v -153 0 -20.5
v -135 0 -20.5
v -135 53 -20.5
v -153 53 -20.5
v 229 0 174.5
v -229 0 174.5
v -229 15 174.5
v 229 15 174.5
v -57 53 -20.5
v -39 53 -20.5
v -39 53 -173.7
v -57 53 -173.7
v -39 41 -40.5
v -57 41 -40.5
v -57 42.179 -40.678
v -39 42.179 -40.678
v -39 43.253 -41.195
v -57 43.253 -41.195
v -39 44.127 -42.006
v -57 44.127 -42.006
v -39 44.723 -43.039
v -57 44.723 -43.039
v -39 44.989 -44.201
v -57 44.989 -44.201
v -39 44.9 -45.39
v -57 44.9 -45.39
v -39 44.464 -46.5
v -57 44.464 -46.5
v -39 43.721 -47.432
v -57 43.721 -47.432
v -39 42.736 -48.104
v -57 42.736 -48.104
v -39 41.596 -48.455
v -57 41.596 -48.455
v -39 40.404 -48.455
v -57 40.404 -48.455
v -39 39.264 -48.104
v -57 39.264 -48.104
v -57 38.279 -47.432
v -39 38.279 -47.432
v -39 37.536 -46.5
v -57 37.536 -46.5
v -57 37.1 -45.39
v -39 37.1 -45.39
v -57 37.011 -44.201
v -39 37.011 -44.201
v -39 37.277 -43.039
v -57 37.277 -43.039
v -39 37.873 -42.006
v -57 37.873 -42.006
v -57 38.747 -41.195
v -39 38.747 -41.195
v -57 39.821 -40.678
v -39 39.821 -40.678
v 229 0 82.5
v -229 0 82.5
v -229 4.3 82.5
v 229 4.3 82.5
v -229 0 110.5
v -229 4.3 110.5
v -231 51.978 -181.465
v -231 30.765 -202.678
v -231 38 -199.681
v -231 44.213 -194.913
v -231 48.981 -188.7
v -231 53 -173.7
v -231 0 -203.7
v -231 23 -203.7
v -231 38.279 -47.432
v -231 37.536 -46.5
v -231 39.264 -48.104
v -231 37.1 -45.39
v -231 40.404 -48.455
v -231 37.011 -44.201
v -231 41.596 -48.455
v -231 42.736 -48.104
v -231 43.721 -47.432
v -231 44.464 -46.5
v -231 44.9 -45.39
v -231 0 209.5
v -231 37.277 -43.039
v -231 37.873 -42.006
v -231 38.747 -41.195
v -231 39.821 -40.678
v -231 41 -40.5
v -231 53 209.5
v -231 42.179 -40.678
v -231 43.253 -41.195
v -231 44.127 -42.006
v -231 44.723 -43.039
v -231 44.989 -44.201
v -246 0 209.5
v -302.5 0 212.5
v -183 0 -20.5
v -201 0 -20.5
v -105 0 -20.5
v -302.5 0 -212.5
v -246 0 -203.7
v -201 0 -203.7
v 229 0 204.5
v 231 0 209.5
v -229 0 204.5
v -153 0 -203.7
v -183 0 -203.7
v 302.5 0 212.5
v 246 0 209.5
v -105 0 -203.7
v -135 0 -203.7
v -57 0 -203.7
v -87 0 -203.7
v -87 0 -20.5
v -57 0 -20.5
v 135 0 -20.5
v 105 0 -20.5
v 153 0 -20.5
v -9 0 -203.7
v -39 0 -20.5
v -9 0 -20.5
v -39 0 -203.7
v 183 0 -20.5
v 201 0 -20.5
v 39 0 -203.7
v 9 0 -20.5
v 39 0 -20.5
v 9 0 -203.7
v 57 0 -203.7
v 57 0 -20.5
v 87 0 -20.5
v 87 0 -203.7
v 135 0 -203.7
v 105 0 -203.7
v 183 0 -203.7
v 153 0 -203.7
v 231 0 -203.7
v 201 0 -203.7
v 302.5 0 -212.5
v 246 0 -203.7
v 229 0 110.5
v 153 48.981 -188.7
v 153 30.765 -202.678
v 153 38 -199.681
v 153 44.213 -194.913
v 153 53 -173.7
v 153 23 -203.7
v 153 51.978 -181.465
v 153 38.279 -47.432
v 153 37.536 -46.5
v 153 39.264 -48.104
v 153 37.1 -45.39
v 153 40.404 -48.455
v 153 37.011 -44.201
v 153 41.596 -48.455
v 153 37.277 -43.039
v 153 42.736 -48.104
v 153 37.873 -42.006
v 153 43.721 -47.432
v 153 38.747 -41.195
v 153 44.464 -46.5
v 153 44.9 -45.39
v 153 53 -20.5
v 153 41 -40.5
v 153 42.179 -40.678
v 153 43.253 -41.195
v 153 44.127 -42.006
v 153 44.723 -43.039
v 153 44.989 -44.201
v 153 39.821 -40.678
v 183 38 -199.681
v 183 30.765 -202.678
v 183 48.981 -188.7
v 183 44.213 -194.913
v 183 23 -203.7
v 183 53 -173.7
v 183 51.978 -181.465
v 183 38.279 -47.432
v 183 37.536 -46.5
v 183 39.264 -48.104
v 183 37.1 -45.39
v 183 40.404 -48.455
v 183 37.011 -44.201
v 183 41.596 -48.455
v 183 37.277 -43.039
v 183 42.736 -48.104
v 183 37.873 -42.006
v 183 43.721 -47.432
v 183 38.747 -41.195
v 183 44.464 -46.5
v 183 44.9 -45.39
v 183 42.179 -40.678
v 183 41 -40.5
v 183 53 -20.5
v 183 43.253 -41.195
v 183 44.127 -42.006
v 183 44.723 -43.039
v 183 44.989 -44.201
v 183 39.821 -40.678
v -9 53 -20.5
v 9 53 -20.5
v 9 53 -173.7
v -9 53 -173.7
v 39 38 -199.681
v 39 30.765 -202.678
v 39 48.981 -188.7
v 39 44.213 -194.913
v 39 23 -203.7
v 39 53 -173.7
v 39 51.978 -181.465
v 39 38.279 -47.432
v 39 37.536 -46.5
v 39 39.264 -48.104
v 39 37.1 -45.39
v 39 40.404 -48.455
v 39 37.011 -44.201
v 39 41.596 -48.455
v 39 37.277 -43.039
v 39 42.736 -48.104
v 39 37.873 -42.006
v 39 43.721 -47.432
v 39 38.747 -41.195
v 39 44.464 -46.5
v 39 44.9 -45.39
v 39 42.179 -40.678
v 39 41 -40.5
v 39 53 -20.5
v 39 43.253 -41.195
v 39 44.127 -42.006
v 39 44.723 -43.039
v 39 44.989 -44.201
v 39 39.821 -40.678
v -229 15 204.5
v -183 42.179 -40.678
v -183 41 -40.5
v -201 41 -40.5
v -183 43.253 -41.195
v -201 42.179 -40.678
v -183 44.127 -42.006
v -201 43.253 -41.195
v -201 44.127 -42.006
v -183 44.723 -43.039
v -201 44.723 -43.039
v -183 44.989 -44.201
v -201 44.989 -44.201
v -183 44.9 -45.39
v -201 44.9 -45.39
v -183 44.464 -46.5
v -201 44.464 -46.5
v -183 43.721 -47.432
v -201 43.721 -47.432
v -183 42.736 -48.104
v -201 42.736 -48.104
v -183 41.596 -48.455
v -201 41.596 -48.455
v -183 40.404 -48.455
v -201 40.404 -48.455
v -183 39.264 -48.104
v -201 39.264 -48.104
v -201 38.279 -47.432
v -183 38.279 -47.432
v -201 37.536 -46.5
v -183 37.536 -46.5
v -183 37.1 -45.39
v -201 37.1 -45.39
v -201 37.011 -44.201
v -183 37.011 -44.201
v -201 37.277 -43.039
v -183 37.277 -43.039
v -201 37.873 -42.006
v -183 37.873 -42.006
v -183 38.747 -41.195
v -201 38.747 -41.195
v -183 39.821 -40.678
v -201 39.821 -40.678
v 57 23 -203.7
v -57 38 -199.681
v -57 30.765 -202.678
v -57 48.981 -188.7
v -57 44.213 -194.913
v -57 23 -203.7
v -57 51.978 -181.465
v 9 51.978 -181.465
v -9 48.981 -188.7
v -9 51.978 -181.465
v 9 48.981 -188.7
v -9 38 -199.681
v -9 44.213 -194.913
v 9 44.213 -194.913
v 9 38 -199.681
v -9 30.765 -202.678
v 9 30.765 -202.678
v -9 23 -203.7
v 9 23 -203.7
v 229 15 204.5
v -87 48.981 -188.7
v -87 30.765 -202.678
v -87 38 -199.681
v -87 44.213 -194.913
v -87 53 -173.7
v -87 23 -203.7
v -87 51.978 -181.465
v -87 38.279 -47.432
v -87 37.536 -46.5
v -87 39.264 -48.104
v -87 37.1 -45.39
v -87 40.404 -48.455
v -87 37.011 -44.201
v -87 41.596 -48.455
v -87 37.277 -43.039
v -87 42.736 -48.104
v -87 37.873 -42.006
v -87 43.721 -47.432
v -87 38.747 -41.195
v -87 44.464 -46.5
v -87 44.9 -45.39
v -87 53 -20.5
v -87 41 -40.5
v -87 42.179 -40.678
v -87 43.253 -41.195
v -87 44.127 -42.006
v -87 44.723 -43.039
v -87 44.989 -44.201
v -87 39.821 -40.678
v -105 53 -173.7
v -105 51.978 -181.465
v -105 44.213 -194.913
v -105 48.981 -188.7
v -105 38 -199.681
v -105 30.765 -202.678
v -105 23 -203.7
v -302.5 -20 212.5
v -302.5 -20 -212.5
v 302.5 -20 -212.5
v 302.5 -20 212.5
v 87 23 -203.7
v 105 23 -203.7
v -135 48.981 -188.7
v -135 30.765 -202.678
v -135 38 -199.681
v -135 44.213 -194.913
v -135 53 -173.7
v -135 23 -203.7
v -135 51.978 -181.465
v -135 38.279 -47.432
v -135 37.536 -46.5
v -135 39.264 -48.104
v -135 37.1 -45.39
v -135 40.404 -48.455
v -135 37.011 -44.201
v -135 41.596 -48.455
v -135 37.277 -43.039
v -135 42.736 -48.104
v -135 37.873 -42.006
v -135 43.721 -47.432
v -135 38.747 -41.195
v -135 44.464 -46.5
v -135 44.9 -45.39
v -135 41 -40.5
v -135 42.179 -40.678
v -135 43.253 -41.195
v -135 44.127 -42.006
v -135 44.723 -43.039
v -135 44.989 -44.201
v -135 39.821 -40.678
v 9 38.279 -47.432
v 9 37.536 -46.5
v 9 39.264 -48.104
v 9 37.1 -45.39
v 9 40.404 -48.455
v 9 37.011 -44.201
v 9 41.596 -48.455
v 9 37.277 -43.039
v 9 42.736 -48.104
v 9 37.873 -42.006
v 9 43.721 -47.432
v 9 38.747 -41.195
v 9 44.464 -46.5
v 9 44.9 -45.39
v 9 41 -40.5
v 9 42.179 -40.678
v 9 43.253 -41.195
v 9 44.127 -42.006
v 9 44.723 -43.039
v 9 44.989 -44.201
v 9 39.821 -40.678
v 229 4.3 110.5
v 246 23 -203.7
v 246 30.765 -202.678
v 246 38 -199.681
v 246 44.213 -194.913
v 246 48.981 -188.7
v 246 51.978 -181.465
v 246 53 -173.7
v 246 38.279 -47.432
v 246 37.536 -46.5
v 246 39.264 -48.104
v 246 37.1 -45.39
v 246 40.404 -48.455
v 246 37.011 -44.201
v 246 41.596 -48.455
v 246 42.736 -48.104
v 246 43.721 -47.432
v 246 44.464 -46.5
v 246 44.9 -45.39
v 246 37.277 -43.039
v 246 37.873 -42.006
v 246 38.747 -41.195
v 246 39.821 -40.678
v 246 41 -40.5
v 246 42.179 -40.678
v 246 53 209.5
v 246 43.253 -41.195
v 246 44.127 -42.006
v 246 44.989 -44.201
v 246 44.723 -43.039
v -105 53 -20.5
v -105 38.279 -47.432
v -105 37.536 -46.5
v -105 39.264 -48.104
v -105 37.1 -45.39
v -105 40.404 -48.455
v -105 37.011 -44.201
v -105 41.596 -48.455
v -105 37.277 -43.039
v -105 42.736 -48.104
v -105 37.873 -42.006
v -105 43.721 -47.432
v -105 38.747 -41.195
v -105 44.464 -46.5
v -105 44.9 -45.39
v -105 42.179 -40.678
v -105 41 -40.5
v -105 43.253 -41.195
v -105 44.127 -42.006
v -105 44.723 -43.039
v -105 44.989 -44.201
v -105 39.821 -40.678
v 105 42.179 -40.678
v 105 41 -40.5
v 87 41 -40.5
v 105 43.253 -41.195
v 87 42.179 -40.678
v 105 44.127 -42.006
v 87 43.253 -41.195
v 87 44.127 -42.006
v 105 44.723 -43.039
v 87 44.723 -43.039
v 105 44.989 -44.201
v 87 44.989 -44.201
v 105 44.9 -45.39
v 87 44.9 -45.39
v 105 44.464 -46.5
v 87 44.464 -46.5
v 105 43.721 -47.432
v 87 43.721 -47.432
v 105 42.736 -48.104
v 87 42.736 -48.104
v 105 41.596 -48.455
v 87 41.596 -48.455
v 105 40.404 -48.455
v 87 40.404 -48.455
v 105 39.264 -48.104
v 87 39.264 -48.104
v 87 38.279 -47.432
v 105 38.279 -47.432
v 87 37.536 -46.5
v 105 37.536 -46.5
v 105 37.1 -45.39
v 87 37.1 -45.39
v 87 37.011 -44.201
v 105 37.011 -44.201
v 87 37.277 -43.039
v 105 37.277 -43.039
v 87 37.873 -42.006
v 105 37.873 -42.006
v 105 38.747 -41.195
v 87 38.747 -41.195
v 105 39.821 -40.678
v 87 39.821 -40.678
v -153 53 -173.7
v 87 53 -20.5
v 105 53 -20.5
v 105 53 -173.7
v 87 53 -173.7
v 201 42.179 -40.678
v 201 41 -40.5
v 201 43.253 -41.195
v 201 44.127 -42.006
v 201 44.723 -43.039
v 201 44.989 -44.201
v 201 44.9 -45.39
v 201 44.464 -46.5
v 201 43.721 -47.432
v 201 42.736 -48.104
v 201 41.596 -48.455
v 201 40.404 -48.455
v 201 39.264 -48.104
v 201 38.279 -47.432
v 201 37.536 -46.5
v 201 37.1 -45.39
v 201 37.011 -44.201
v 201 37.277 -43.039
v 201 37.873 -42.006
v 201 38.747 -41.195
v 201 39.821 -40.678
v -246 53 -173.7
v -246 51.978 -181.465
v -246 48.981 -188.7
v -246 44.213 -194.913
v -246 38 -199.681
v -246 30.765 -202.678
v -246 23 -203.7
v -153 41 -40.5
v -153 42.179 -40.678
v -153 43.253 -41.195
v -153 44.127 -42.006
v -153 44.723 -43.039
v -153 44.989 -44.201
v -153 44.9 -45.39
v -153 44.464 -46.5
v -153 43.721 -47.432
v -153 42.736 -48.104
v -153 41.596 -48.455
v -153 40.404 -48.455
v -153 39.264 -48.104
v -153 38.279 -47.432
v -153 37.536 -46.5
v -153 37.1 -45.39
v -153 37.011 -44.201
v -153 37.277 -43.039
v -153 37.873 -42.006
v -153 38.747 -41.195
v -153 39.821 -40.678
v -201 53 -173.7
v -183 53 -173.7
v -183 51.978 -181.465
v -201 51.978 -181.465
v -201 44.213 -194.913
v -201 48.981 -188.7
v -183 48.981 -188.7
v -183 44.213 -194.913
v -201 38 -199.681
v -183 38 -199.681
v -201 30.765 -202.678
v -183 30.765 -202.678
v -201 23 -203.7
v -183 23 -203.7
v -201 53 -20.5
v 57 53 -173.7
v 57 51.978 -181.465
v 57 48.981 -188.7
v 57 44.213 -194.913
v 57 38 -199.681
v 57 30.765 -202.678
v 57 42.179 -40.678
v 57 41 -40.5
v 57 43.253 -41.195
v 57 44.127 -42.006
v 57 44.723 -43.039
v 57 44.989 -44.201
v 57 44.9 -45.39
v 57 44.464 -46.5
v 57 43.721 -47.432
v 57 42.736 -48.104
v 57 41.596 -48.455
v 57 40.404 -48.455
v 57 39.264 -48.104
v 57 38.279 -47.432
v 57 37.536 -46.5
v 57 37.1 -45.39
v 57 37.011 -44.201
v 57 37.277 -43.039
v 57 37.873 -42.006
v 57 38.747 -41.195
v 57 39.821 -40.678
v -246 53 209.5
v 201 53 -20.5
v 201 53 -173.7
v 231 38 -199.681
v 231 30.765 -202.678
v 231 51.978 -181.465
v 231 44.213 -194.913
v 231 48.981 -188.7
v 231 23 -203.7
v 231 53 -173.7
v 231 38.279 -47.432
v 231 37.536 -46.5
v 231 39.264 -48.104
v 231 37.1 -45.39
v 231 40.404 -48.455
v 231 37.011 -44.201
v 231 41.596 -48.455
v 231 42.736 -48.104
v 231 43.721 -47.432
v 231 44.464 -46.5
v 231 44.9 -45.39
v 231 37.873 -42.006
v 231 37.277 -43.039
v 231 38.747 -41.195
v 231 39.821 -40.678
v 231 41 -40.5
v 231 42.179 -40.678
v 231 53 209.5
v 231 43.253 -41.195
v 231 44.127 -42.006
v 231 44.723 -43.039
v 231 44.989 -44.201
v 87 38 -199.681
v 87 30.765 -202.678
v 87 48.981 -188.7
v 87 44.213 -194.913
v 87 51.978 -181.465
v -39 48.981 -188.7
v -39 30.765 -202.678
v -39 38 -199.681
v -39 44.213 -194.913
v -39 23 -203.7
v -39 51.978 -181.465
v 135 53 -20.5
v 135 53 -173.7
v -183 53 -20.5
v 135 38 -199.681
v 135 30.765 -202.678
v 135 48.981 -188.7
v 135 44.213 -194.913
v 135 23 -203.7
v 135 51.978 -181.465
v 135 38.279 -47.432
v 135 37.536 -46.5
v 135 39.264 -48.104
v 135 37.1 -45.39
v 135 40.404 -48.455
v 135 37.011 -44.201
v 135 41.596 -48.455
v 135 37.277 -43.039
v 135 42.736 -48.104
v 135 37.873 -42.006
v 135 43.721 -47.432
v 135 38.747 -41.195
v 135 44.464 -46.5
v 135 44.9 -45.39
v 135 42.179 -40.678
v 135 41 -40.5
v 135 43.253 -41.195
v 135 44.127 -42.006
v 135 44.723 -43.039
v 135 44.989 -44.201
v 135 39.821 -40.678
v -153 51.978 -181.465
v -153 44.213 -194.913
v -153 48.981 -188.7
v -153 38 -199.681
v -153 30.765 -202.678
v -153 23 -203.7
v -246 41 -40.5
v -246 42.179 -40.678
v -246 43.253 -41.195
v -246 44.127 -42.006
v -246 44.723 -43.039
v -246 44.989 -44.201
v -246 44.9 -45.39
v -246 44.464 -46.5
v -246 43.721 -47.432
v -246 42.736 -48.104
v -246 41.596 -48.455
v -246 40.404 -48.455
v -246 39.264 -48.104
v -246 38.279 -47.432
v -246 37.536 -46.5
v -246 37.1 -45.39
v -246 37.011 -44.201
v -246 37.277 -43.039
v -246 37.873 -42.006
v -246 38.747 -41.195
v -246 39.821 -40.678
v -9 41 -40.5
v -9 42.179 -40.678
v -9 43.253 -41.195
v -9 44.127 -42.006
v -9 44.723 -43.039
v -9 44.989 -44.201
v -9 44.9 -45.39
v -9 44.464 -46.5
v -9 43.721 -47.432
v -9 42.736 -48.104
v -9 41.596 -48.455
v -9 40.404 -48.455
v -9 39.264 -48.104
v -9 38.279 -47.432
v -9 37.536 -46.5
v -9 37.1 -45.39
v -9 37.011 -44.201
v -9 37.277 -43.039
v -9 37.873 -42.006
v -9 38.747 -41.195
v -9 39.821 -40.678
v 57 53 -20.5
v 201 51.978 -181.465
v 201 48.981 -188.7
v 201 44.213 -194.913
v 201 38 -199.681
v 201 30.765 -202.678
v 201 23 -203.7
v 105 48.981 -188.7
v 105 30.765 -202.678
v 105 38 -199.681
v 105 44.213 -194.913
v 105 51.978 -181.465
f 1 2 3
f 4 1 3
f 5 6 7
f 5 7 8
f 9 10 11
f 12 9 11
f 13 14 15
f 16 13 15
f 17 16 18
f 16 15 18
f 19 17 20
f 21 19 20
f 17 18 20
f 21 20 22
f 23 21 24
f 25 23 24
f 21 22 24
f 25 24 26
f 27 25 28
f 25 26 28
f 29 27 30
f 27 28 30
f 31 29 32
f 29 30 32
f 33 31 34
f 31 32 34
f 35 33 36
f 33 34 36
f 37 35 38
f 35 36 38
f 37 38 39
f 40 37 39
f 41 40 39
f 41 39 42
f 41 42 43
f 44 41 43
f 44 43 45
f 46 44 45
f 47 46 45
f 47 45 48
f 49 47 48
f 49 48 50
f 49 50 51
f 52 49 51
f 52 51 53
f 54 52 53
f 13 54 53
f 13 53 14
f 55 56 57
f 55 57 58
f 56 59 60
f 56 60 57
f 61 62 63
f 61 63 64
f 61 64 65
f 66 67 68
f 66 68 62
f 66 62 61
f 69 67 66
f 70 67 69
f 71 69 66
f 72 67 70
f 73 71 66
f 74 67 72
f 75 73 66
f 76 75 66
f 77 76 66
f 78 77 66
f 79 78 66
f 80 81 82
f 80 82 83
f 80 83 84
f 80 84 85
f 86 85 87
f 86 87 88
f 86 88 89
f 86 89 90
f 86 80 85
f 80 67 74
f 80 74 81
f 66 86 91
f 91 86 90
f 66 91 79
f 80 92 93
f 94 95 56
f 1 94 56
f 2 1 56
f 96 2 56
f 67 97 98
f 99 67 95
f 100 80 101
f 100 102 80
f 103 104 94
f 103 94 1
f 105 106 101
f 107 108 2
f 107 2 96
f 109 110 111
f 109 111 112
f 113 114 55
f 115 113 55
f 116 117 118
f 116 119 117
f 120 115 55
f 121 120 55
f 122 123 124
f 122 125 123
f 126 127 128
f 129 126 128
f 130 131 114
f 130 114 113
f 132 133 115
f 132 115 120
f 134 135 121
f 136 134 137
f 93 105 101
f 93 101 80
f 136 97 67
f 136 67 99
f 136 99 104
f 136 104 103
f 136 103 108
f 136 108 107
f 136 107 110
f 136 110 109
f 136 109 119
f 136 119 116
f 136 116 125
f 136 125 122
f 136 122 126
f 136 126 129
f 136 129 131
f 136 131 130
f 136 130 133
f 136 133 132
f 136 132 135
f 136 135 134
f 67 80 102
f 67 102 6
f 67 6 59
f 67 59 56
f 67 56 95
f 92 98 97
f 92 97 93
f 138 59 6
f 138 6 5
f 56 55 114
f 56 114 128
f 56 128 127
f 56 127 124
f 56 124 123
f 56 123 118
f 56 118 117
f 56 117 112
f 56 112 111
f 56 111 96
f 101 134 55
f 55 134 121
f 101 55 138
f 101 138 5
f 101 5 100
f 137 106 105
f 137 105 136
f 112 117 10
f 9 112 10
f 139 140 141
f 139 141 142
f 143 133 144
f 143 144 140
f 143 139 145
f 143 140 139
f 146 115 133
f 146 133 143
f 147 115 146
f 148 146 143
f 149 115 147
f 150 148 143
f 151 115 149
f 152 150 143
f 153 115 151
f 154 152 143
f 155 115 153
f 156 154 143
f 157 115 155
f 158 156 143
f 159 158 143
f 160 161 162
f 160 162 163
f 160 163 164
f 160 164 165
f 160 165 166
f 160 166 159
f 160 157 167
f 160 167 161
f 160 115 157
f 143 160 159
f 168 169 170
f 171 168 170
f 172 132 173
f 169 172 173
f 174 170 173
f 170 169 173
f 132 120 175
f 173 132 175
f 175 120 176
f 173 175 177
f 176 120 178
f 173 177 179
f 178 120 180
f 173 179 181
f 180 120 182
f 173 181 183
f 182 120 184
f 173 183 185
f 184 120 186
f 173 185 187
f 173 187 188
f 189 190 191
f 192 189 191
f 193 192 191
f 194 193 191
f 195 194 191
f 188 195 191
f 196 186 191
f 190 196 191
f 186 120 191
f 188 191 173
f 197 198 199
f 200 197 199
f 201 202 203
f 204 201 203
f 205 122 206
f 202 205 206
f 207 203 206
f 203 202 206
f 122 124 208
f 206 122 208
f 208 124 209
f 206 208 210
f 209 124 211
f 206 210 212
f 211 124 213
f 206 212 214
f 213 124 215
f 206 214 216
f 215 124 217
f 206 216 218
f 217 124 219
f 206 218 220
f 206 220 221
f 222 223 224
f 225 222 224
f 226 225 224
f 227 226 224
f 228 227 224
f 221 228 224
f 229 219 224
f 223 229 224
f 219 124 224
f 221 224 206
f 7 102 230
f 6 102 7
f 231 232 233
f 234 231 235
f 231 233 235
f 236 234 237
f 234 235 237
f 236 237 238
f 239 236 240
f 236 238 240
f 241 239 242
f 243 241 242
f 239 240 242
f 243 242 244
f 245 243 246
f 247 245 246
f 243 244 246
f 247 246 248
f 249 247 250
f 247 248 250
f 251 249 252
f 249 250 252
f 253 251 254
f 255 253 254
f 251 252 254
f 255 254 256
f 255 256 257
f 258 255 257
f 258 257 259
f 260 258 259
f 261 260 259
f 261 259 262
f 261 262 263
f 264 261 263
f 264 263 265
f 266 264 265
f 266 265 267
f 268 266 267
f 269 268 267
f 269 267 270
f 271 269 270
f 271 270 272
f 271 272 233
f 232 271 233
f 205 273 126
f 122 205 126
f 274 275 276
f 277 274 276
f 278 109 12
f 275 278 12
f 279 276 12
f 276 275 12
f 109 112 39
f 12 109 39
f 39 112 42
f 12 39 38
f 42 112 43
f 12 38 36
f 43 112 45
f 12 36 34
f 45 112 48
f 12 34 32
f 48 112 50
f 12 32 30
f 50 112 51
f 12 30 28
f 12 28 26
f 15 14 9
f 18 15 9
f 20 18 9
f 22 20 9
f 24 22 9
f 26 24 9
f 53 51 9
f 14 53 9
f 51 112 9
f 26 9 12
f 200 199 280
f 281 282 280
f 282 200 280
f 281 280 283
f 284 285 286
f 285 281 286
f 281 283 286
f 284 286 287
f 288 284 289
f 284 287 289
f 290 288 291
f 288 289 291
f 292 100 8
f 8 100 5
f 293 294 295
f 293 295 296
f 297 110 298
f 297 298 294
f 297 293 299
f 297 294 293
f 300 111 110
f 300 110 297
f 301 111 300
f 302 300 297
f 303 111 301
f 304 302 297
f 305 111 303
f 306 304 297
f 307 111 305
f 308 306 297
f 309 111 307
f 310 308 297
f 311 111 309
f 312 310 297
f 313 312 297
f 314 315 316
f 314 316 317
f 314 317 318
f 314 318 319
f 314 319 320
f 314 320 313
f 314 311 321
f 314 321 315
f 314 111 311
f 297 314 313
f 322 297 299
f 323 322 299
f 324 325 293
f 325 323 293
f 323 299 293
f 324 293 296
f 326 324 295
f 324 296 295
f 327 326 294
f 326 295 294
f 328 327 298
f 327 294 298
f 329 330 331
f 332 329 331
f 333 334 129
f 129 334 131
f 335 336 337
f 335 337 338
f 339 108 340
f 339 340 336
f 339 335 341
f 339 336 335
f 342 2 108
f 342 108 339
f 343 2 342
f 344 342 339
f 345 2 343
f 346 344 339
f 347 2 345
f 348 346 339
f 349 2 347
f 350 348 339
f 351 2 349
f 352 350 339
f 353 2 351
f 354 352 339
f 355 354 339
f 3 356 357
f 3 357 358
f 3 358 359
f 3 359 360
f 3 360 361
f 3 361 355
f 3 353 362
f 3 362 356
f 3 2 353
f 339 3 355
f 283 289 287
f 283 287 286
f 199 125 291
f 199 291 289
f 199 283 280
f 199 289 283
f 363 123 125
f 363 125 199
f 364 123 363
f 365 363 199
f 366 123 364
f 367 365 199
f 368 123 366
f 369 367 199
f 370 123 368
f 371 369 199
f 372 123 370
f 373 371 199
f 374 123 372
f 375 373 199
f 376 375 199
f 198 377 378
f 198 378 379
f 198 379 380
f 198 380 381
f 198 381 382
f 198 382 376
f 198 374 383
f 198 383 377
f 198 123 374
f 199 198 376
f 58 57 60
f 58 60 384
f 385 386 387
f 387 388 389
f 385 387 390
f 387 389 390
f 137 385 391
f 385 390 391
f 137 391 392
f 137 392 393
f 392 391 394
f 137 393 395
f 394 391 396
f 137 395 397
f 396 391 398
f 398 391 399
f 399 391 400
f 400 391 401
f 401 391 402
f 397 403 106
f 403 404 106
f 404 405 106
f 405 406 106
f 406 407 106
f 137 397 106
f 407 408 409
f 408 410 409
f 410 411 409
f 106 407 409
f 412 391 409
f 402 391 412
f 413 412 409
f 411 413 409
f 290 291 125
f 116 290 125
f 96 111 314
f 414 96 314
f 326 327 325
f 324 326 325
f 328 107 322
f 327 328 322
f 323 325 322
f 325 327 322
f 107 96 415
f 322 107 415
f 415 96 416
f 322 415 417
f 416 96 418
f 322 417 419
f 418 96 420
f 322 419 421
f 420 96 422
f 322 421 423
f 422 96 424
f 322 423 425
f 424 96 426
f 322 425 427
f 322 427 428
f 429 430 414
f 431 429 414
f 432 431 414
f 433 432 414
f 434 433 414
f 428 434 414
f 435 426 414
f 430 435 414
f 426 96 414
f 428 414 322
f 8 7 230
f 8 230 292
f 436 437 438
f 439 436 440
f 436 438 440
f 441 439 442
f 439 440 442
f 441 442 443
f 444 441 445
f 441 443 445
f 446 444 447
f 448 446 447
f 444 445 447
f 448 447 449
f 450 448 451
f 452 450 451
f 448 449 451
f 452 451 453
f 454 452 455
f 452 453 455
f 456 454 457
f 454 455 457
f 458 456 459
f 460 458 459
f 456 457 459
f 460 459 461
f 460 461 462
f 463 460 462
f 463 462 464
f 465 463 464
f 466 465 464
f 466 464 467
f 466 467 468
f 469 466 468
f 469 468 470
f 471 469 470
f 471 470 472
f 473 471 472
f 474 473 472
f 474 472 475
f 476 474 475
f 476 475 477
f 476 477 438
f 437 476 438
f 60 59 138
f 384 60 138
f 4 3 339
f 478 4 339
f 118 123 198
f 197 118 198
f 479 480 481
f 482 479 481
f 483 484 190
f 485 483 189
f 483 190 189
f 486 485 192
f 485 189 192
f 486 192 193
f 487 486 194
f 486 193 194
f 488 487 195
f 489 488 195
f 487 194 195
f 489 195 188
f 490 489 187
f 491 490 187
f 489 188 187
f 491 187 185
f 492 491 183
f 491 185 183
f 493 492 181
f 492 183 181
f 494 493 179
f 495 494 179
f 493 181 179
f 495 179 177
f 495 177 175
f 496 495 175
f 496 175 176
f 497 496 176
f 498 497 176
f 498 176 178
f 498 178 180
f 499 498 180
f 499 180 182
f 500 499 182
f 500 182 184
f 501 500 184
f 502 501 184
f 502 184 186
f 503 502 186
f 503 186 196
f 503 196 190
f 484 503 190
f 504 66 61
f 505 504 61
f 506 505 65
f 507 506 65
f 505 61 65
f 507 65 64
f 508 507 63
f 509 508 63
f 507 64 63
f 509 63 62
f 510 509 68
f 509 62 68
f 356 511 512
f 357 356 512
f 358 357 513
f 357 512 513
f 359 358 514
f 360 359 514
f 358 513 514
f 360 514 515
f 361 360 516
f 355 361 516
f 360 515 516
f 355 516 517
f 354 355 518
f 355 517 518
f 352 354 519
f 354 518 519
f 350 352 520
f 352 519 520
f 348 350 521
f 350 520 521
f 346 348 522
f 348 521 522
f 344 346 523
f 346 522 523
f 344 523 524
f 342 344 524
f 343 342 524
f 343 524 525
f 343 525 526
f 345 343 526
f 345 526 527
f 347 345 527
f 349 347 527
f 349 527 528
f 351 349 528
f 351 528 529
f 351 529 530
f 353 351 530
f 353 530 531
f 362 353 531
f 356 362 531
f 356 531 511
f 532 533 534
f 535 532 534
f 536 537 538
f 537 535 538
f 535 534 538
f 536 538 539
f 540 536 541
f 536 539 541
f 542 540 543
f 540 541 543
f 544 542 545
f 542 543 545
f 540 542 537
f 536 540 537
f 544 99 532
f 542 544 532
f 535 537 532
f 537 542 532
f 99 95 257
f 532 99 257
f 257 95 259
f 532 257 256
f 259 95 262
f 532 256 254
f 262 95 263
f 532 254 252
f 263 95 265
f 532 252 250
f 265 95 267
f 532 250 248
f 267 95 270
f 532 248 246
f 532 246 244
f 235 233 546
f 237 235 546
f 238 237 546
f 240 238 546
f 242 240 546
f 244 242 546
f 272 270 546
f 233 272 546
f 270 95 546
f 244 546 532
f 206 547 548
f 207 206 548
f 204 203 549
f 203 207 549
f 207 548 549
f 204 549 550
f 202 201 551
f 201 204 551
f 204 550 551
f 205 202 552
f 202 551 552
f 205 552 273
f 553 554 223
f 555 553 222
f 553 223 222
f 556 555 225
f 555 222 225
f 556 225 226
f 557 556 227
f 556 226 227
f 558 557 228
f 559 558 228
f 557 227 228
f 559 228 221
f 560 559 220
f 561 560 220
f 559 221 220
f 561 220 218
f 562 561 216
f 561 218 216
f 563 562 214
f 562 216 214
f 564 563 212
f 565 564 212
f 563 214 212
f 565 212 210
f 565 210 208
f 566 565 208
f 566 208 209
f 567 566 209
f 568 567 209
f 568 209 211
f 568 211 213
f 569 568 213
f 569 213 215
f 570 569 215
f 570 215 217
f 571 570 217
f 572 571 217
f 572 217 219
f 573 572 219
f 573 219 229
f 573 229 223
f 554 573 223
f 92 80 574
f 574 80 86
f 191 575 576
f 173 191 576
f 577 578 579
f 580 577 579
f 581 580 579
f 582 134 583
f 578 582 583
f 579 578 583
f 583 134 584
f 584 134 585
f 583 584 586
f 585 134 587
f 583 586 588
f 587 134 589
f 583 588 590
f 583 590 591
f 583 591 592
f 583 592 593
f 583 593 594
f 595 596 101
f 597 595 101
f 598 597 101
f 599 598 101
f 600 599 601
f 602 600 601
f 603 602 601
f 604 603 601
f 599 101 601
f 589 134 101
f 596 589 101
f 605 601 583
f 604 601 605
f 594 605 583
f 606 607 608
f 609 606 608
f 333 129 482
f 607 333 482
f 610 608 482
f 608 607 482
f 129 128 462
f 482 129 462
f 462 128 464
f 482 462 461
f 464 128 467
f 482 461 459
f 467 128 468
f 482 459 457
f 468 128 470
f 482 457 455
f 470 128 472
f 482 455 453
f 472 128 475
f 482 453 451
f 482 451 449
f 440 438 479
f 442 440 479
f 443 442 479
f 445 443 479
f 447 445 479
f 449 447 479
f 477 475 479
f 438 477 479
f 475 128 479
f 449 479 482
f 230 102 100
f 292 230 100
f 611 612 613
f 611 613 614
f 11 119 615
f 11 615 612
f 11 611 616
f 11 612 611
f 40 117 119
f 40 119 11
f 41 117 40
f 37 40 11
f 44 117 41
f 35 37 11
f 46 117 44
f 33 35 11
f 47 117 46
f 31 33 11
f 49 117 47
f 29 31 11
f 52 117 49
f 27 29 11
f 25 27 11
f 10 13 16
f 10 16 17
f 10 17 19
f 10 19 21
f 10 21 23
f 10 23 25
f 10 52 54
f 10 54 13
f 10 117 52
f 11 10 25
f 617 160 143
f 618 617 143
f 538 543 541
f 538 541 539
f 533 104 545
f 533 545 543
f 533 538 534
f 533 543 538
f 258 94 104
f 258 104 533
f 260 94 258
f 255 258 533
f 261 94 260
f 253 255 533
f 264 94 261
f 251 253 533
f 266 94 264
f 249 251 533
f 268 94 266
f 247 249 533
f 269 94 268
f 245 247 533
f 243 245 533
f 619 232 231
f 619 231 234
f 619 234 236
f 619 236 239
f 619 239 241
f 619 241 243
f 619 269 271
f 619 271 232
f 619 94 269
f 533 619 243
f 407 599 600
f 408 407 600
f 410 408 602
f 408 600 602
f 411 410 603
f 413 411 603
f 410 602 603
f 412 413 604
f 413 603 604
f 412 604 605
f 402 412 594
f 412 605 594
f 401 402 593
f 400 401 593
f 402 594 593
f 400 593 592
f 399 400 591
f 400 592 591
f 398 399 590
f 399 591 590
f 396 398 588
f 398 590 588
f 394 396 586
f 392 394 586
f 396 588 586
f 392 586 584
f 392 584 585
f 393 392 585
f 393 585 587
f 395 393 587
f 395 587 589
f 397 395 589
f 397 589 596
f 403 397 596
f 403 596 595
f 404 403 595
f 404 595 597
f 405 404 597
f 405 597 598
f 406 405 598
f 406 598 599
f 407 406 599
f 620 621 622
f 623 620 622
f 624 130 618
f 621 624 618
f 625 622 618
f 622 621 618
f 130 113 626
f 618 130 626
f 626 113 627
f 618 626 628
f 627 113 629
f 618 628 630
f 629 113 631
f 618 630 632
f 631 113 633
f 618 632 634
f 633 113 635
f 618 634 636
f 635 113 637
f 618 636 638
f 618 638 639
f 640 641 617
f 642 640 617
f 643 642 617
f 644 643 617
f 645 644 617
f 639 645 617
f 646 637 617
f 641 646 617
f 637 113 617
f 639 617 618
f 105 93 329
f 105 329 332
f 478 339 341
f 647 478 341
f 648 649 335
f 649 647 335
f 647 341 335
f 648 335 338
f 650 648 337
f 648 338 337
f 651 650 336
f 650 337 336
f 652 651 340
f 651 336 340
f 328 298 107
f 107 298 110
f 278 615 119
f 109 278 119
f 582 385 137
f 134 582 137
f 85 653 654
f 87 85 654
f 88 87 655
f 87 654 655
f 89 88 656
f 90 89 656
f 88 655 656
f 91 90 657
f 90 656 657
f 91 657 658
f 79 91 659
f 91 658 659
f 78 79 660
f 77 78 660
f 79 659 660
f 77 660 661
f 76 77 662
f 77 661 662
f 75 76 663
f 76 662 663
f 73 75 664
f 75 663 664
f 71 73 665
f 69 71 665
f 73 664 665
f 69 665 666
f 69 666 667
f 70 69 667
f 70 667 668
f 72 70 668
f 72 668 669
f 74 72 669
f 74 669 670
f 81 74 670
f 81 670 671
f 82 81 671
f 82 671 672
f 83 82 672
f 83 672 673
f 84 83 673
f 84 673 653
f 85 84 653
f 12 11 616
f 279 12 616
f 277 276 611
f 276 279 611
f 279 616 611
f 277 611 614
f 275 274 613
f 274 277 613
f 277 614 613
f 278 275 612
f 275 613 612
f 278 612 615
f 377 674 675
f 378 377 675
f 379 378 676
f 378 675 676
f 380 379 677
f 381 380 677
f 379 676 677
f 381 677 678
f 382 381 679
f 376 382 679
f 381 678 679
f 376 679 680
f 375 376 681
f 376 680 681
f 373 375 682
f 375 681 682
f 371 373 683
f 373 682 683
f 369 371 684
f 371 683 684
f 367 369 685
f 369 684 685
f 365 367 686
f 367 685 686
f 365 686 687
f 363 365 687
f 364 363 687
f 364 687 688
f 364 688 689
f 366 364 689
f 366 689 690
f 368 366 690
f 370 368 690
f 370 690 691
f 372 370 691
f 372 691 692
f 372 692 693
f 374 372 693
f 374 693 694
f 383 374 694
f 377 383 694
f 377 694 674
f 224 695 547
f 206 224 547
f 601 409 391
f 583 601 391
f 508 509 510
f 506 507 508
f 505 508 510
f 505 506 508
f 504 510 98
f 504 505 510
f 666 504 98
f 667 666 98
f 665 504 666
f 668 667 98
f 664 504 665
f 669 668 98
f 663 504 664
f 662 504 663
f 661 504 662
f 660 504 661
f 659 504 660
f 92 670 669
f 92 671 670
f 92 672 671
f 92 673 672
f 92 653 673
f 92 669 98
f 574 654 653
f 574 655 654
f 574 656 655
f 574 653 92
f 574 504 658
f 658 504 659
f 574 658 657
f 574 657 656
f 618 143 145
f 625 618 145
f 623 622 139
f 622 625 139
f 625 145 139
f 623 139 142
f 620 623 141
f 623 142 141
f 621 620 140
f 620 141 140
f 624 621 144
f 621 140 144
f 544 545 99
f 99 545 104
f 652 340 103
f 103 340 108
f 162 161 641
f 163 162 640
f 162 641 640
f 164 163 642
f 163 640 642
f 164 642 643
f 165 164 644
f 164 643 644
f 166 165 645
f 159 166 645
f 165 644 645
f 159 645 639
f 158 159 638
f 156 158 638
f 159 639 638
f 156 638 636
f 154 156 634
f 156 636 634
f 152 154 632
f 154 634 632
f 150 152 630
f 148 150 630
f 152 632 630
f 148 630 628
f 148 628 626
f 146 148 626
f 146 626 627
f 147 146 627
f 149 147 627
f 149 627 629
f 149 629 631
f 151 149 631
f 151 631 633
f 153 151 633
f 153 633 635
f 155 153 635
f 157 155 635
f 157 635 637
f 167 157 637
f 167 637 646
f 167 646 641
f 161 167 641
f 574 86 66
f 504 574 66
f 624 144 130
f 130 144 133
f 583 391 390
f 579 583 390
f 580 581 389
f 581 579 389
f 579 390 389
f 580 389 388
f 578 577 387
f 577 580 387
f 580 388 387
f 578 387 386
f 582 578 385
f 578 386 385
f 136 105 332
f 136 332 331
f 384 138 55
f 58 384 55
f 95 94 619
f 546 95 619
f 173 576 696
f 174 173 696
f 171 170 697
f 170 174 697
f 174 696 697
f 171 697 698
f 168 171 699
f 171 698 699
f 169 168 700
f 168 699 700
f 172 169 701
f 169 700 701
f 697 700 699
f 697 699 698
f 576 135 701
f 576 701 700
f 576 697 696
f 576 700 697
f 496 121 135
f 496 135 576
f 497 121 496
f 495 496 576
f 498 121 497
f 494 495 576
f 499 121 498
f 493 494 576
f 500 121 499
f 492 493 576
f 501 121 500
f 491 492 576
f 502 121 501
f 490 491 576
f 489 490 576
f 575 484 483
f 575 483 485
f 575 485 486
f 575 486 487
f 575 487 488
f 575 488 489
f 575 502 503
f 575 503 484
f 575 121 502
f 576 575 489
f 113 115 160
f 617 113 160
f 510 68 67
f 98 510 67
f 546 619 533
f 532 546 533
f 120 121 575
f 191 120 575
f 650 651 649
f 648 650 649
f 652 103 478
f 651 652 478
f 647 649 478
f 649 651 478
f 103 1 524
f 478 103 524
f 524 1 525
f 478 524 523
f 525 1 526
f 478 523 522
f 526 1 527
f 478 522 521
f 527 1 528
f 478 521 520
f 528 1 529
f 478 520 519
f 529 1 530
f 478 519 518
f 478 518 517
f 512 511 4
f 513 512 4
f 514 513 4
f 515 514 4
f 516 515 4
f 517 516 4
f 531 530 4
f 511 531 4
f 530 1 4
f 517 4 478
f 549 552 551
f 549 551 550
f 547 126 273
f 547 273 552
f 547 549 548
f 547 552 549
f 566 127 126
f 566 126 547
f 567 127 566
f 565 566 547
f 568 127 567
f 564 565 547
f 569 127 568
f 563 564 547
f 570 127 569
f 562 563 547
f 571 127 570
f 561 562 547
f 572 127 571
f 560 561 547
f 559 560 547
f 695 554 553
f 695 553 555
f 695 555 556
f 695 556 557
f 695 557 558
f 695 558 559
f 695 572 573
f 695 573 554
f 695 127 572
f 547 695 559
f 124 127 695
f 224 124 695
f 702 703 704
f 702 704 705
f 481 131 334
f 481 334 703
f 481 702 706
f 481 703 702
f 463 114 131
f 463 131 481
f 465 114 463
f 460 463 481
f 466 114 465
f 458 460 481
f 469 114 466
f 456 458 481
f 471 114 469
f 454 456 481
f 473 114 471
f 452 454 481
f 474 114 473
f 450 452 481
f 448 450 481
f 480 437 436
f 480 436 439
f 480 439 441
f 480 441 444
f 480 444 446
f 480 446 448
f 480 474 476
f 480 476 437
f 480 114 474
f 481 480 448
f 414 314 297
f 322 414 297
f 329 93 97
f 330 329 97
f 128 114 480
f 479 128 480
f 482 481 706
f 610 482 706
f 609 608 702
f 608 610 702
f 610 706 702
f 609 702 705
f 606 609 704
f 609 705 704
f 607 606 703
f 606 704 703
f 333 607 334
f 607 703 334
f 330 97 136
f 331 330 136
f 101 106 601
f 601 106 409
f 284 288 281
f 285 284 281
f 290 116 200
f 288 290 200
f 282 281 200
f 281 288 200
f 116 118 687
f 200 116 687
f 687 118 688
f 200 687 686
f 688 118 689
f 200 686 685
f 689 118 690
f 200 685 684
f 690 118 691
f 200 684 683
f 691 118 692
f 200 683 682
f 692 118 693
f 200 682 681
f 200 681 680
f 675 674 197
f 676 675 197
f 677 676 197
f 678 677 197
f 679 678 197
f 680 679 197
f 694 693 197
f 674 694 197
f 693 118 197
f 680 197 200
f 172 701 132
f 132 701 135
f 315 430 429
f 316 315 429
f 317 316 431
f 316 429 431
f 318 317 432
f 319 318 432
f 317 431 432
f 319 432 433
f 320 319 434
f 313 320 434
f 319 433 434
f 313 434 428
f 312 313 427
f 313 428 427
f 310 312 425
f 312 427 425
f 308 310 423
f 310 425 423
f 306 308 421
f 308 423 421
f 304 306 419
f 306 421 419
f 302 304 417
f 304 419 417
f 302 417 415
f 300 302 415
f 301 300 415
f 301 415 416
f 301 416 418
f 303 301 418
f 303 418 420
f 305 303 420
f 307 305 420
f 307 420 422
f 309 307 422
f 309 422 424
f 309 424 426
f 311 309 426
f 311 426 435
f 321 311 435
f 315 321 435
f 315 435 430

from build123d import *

# Parameters (mm, degrees)
SKETCH1_W           = 605
SKETCH1_H           = 425
BOSS_EXTRUDE1_DEPTH = 20
BOSS_EXTRUDE2_DEPTH = 246
SKETCH3_W           = 30
SKETCH3_H           = 53
CUT_EXTRUDE1_DEPTH  = 423
SKETCH4_R           = 4
CUT_EXTRUDE2_DEPTH  = 549.5
SKETCH5_W           = 230
SKETCH5_H           = 53
CUT_EXTRUDE3_DEPTH  = 220
SKETCH6_W           = 458
SKETCH6_H           = 30
BOSS_EXTRUDE3_DEPTH = 15
SKETCH7_W           = 458
SKETCH7_H           = 28
BOSS_EXTRUDE4_DEPTH = 4.3


with BuildPart() as part:
    # Sketch1 → Boss-Extrude1 (new body)
    with BuildSketch(Plane(origin=(0, 0, 0), x_dir=(1, 0, 0), z_dir=(0, 1, 0))):
        Rectangle(SKETCH1_W, SKETCH1_H)
    extrude(amount=-BOSS_EXTRUDE1_DEPTH)

    # Sketch2 → Boss-Extrude2 (add, symmetric)
    with BuildSketch(Plane(origin=(0, 0, 0), x_dir=(0, 0, -1), z_dir=(1, 0, 0))):
        with BuildLine():
            Line((203.7, 0), (-209.5, 0))
            Line((-209.5, 0), (-209.5, 53))
            Line((-209.5, 53), (173.7, 53))
            ThreePointArc((173.7, 53), (194.913203436, 44.213203436), (203.7, 23))
            Line((203.7, 23), (203.7, 0))
        make_face()
    extrude(amount=BOSS_EXTRUDE2_DEPTH, both=True)

    # Sketch3 → Cut-Extrude1 (cut, through all)
    with BuildSketch(Plane.XY.offset(209.5)):
        with Locations((-216, 26.5)):
            Rectangle(SKETCH3_W, SKETCH3_H)
        with Locations((-168, 26.5)):
            Rectangle(SKETCH3_W, SKETCH3_H)
        with Locations((-120, 26.5)):
            Rectangle(SKETCH3_W, SKETCH3_H)
        with Locations((-72, 26.5)):
            Rectangle(SKETCH3_W, SKETCH3_H)
        with Locations((-24, 26.5)):
            Rectangle(SKETCH3_W, SKETCH3_H)
        with Locations((24, 26.5)):
            Rectangle(SKETCH3_W, SKETCH3_H)
        with Locations((72, 26.5)):
            Rectangle(SKETCH3_W, SKETCH3_H)
        with Locations((120, 26.5)):
            Rectangle(SKETCH3_W, SKETCH3_H)
        with Locations((168, 26.5)):
            Rectangle(SKETCH3_W, SKETCH3_H)
        with Locations((216, 26.5)):
            Rectangle(SKETCH3_W, SKETCH3_H)
    extrude(amount=-CUT_EXTRUDE1_DEPTH, mode=Mode.SUBTRACT)

    # Sketch4 → Cut-Extrude2 (cut, through all)
    with BuildSketch(Plane.ZY.offset(246)):
        with Locations((-44.5, 41)):
            Circle(SKETCH4_R)
    extrude(amount=-CUT_EXTRUDE2_DEPTH, mode=Mode.SUBTRACT)

    # Sketch5 → Cut-Extrude3 (cut, symmetric)
    with BuildSketch(Plane(origin=(0, 0, 0), x_dir=(0, 0, -1), z_dir=(1, 0, 0))):
        with Locations((-94.5, 26.5)):
            Rectangle(SKETCH5_W, SKETCH5_H)
    extrude(amount=CUT_EXTRUDE3_DEPTH, both=True, mode=Mode.SUBTRACT)

    # Sketch6 → Boss-Extrude3 (add)
    with BuildSketch(Plane(origin=(0, 0, 0), x_dir=(1, 0, 0), z_dir=(0, 1, 0))):
        with Locations((0, -189.5)):
            Rectangle(SKETCH6_W, SKETCH6_H)
    extrude(amount=BOSS_EXTRUDE3_DEPTH)

    # Sketch7 → Boss-Extrude4 (add)
    with BuildSketch(Plane(origin=(0, 0, 0), x_dir=(1, 0, 0), z_dir=(0, 1, 0))):
        with Locations((0, -96.5)):
            Rectangle(SKETCH7_W, SKETCH7_H)
    extrude(amount=BOSS_EXTRUDE4_DEPTH)


solid = part.part
